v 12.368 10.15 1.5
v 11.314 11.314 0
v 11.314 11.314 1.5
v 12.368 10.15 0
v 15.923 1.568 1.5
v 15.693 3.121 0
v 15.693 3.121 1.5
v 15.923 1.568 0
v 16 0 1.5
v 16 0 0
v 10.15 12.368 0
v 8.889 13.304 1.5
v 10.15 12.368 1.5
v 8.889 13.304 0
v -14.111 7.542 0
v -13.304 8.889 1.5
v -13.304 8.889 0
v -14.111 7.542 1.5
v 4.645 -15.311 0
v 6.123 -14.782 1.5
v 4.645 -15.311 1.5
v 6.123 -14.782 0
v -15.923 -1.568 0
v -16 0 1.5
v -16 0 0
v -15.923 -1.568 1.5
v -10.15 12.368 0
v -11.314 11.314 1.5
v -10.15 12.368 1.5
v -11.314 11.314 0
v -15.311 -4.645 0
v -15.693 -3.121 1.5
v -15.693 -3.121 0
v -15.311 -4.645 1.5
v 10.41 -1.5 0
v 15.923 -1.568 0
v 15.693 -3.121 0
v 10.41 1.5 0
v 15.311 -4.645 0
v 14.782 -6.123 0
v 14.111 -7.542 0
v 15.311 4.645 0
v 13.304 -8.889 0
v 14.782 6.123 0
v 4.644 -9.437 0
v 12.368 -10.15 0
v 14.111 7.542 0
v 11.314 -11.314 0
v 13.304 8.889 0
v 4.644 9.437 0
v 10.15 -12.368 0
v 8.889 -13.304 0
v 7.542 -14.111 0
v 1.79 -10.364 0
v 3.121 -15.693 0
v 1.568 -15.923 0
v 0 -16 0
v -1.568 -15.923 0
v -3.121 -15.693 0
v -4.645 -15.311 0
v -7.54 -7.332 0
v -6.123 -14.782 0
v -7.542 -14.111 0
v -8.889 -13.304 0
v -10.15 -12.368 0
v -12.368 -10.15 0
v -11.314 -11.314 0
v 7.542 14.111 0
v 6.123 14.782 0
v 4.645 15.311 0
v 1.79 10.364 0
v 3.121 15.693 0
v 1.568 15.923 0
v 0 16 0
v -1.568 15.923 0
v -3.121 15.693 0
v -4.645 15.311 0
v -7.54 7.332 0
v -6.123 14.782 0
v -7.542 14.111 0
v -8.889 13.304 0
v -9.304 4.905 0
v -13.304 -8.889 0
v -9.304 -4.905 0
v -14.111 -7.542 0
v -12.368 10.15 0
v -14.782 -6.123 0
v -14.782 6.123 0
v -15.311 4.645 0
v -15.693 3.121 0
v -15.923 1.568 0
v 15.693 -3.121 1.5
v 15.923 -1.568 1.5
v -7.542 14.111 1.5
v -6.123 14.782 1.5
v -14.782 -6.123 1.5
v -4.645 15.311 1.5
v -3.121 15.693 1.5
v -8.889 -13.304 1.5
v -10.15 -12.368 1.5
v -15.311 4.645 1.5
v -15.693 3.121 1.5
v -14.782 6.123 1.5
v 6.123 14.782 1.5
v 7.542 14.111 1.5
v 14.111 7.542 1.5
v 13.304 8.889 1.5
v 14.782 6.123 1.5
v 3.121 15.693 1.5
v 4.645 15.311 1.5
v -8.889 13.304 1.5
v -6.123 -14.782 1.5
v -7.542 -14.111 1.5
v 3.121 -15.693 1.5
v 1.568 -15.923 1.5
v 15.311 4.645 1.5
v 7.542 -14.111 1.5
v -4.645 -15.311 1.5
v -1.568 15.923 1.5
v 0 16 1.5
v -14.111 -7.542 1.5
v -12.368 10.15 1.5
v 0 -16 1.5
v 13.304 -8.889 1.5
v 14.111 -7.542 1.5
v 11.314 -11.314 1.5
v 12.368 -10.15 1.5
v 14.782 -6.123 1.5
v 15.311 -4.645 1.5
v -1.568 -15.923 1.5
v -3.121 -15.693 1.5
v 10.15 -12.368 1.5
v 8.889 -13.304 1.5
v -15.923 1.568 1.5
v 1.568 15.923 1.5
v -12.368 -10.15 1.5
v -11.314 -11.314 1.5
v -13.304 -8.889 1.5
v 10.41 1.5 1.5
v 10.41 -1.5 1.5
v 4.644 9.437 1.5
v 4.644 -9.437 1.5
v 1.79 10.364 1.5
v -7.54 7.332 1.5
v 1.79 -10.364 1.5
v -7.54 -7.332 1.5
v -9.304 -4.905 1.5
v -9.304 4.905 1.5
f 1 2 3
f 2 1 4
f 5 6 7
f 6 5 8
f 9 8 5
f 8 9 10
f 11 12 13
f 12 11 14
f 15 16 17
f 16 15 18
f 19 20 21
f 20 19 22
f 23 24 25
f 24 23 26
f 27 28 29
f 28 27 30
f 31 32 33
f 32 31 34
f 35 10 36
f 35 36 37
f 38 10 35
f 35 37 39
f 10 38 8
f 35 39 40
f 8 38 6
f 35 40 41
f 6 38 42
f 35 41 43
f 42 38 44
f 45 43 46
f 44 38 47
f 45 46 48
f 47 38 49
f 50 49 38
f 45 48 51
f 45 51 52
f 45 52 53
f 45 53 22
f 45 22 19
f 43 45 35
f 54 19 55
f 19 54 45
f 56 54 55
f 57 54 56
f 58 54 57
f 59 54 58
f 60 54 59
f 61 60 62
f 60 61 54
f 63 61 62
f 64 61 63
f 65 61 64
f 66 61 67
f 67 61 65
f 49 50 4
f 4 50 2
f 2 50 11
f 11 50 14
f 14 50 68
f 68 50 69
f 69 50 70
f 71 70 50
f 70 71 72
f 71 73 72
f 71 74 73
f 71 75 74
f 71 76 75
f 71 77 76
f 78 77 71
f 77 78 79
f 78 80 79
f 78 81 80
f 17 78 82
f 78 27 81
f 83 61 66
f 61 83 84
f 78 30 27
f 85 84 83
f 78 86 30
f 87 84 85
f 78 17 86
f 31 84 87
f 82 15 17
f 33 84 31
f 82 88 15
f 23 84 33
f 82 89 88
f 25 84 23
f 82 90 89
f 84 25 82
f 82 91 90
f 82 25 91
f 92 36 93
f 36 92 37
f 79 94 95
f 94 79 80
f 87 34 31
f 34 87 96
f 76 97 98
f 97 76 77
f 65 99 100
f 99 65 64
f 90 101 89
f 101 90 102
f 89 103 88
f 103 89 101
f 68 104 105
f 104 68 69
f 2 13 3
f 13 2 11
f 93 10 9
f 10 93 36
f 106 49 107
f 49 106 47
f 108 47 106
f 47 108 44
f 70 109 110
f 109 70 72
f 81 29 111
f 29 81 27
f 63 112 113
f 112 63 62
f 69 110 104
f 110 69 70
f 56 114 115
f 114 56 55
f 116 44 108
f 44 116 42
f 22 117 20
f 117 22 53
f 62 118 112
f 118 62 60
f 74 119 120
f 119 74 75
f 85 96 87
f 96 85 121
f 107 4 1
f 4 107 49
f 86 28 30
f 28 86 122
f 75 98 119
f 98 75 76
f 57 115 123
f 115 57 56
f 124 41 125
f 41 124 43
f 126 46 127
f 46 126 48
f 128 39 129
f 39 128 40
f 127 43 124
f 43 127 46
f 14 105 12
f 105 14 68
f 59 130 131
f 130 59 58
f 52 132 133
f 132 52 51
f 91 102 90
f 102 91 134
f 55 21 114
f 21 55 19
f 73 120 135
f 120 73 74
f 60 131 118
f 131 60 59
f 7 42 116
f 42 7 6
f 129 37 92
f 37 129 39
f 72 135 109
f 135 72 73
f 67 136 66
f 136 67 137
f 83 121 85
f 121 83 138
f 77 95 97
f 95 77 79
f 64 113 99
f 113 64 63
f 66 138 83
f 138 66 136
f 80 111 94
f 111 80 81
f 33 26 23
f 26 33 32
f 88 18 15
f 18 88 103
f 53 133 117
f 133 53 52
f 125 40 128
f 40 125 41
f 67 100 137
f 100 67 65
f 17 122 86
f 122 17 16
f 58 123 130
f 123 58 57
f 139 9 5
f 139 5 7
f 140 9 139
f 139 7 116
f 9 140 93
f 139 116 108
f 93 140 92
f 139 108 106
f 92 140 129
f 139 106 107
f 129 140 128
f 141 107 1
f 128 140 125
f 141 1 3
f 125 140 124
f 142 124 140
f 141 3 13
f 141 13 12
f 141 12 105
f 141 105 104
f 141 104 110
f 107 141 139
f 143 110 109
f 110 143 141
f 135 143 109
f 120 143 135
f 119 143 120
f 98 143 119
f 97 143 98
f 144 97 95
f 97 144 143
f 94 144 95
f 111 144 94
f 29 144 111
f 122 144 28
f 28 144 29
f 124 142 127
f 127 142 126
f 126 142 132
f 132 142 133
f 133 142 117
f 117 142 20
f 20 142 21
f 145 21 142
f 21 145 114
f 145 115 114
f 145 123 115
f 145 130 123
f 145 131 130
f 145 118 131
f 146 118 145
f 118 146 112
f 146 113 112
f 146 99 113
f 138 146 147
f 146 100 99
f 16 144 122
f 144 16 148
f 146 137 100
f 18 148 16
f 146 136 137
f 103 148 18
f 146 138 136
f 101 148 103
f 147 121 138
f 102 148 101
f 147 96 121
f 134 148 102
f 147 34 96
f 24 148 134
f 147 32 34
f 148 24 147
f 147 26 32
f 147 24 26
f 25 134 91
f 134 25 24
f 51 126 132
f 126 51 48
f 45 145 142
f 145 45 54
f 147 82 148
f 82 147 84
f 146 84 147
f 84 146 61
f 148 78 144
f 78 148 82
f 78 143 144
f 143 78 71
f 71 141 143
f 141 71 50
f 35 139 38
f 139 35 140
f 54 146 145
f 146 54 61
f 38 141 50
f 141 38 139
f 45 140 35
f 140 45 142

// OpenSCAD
// Flat gauge for AO-02 electrical boss shape verification
// Parent: regular pentagon, circumdiameter ao_elec_od
// Each of 5 vertices truncated to a 3 mm flat → decagon (10 sides)
// Print and try the hole over the real sensor boss.

ao_elec_od   = 23.0;         // parent pentagon circumscribed Ø (was 20 → 21 → 22 → 23)
corner_flat  = 3.0;          // straight at each former vertex
gauge_t      = 1.5;          // thin plate for quick print
outer_d      = 32.0;
fn           = 64;

R = ao_elec_od / 2;

// Distance along each edge from vertex to truncation point
function trunc_s(flat) = flat / (2 * sin(54));

function pent_verts(r) =
    [for (i = [0:4]) [r * cos(i * 72), r * sin(i * 72)]];

// 10 vertices: for each pentagon vertex, two points on adjacent edges
function trunc_pent_verts(r, flat = 3) =
    let(s = trunc_s(flat), pv = pent_verts(r))
    [
        for (i = [0:4])
            let(
                v    = pv[i],
                prev = pv[(i + 4) % 5],
                next = pv[(i + 1) % 5],
                lp   = norm(prev - v),
                ln   = norm(next - v)
            )
            each [
                v + s * (prev - v) / lp,
                v + s * (next - v) / ln
            ]
    ];

module ao_elec_profile() {
    polygon(trunc_pent_verts(R, corner_flat));
}

// Female ring: hole to slip over sensor boss
module gauge_female() {
    difference() {
        cylinder(h = gauge_t, d = outer_d, $fn = fn);
        translate([0, 0, -0.05])
            linear_extrude(height = gauge_t + 0.1)
                ao_elec_profile();
    }
}

gauge_female();
